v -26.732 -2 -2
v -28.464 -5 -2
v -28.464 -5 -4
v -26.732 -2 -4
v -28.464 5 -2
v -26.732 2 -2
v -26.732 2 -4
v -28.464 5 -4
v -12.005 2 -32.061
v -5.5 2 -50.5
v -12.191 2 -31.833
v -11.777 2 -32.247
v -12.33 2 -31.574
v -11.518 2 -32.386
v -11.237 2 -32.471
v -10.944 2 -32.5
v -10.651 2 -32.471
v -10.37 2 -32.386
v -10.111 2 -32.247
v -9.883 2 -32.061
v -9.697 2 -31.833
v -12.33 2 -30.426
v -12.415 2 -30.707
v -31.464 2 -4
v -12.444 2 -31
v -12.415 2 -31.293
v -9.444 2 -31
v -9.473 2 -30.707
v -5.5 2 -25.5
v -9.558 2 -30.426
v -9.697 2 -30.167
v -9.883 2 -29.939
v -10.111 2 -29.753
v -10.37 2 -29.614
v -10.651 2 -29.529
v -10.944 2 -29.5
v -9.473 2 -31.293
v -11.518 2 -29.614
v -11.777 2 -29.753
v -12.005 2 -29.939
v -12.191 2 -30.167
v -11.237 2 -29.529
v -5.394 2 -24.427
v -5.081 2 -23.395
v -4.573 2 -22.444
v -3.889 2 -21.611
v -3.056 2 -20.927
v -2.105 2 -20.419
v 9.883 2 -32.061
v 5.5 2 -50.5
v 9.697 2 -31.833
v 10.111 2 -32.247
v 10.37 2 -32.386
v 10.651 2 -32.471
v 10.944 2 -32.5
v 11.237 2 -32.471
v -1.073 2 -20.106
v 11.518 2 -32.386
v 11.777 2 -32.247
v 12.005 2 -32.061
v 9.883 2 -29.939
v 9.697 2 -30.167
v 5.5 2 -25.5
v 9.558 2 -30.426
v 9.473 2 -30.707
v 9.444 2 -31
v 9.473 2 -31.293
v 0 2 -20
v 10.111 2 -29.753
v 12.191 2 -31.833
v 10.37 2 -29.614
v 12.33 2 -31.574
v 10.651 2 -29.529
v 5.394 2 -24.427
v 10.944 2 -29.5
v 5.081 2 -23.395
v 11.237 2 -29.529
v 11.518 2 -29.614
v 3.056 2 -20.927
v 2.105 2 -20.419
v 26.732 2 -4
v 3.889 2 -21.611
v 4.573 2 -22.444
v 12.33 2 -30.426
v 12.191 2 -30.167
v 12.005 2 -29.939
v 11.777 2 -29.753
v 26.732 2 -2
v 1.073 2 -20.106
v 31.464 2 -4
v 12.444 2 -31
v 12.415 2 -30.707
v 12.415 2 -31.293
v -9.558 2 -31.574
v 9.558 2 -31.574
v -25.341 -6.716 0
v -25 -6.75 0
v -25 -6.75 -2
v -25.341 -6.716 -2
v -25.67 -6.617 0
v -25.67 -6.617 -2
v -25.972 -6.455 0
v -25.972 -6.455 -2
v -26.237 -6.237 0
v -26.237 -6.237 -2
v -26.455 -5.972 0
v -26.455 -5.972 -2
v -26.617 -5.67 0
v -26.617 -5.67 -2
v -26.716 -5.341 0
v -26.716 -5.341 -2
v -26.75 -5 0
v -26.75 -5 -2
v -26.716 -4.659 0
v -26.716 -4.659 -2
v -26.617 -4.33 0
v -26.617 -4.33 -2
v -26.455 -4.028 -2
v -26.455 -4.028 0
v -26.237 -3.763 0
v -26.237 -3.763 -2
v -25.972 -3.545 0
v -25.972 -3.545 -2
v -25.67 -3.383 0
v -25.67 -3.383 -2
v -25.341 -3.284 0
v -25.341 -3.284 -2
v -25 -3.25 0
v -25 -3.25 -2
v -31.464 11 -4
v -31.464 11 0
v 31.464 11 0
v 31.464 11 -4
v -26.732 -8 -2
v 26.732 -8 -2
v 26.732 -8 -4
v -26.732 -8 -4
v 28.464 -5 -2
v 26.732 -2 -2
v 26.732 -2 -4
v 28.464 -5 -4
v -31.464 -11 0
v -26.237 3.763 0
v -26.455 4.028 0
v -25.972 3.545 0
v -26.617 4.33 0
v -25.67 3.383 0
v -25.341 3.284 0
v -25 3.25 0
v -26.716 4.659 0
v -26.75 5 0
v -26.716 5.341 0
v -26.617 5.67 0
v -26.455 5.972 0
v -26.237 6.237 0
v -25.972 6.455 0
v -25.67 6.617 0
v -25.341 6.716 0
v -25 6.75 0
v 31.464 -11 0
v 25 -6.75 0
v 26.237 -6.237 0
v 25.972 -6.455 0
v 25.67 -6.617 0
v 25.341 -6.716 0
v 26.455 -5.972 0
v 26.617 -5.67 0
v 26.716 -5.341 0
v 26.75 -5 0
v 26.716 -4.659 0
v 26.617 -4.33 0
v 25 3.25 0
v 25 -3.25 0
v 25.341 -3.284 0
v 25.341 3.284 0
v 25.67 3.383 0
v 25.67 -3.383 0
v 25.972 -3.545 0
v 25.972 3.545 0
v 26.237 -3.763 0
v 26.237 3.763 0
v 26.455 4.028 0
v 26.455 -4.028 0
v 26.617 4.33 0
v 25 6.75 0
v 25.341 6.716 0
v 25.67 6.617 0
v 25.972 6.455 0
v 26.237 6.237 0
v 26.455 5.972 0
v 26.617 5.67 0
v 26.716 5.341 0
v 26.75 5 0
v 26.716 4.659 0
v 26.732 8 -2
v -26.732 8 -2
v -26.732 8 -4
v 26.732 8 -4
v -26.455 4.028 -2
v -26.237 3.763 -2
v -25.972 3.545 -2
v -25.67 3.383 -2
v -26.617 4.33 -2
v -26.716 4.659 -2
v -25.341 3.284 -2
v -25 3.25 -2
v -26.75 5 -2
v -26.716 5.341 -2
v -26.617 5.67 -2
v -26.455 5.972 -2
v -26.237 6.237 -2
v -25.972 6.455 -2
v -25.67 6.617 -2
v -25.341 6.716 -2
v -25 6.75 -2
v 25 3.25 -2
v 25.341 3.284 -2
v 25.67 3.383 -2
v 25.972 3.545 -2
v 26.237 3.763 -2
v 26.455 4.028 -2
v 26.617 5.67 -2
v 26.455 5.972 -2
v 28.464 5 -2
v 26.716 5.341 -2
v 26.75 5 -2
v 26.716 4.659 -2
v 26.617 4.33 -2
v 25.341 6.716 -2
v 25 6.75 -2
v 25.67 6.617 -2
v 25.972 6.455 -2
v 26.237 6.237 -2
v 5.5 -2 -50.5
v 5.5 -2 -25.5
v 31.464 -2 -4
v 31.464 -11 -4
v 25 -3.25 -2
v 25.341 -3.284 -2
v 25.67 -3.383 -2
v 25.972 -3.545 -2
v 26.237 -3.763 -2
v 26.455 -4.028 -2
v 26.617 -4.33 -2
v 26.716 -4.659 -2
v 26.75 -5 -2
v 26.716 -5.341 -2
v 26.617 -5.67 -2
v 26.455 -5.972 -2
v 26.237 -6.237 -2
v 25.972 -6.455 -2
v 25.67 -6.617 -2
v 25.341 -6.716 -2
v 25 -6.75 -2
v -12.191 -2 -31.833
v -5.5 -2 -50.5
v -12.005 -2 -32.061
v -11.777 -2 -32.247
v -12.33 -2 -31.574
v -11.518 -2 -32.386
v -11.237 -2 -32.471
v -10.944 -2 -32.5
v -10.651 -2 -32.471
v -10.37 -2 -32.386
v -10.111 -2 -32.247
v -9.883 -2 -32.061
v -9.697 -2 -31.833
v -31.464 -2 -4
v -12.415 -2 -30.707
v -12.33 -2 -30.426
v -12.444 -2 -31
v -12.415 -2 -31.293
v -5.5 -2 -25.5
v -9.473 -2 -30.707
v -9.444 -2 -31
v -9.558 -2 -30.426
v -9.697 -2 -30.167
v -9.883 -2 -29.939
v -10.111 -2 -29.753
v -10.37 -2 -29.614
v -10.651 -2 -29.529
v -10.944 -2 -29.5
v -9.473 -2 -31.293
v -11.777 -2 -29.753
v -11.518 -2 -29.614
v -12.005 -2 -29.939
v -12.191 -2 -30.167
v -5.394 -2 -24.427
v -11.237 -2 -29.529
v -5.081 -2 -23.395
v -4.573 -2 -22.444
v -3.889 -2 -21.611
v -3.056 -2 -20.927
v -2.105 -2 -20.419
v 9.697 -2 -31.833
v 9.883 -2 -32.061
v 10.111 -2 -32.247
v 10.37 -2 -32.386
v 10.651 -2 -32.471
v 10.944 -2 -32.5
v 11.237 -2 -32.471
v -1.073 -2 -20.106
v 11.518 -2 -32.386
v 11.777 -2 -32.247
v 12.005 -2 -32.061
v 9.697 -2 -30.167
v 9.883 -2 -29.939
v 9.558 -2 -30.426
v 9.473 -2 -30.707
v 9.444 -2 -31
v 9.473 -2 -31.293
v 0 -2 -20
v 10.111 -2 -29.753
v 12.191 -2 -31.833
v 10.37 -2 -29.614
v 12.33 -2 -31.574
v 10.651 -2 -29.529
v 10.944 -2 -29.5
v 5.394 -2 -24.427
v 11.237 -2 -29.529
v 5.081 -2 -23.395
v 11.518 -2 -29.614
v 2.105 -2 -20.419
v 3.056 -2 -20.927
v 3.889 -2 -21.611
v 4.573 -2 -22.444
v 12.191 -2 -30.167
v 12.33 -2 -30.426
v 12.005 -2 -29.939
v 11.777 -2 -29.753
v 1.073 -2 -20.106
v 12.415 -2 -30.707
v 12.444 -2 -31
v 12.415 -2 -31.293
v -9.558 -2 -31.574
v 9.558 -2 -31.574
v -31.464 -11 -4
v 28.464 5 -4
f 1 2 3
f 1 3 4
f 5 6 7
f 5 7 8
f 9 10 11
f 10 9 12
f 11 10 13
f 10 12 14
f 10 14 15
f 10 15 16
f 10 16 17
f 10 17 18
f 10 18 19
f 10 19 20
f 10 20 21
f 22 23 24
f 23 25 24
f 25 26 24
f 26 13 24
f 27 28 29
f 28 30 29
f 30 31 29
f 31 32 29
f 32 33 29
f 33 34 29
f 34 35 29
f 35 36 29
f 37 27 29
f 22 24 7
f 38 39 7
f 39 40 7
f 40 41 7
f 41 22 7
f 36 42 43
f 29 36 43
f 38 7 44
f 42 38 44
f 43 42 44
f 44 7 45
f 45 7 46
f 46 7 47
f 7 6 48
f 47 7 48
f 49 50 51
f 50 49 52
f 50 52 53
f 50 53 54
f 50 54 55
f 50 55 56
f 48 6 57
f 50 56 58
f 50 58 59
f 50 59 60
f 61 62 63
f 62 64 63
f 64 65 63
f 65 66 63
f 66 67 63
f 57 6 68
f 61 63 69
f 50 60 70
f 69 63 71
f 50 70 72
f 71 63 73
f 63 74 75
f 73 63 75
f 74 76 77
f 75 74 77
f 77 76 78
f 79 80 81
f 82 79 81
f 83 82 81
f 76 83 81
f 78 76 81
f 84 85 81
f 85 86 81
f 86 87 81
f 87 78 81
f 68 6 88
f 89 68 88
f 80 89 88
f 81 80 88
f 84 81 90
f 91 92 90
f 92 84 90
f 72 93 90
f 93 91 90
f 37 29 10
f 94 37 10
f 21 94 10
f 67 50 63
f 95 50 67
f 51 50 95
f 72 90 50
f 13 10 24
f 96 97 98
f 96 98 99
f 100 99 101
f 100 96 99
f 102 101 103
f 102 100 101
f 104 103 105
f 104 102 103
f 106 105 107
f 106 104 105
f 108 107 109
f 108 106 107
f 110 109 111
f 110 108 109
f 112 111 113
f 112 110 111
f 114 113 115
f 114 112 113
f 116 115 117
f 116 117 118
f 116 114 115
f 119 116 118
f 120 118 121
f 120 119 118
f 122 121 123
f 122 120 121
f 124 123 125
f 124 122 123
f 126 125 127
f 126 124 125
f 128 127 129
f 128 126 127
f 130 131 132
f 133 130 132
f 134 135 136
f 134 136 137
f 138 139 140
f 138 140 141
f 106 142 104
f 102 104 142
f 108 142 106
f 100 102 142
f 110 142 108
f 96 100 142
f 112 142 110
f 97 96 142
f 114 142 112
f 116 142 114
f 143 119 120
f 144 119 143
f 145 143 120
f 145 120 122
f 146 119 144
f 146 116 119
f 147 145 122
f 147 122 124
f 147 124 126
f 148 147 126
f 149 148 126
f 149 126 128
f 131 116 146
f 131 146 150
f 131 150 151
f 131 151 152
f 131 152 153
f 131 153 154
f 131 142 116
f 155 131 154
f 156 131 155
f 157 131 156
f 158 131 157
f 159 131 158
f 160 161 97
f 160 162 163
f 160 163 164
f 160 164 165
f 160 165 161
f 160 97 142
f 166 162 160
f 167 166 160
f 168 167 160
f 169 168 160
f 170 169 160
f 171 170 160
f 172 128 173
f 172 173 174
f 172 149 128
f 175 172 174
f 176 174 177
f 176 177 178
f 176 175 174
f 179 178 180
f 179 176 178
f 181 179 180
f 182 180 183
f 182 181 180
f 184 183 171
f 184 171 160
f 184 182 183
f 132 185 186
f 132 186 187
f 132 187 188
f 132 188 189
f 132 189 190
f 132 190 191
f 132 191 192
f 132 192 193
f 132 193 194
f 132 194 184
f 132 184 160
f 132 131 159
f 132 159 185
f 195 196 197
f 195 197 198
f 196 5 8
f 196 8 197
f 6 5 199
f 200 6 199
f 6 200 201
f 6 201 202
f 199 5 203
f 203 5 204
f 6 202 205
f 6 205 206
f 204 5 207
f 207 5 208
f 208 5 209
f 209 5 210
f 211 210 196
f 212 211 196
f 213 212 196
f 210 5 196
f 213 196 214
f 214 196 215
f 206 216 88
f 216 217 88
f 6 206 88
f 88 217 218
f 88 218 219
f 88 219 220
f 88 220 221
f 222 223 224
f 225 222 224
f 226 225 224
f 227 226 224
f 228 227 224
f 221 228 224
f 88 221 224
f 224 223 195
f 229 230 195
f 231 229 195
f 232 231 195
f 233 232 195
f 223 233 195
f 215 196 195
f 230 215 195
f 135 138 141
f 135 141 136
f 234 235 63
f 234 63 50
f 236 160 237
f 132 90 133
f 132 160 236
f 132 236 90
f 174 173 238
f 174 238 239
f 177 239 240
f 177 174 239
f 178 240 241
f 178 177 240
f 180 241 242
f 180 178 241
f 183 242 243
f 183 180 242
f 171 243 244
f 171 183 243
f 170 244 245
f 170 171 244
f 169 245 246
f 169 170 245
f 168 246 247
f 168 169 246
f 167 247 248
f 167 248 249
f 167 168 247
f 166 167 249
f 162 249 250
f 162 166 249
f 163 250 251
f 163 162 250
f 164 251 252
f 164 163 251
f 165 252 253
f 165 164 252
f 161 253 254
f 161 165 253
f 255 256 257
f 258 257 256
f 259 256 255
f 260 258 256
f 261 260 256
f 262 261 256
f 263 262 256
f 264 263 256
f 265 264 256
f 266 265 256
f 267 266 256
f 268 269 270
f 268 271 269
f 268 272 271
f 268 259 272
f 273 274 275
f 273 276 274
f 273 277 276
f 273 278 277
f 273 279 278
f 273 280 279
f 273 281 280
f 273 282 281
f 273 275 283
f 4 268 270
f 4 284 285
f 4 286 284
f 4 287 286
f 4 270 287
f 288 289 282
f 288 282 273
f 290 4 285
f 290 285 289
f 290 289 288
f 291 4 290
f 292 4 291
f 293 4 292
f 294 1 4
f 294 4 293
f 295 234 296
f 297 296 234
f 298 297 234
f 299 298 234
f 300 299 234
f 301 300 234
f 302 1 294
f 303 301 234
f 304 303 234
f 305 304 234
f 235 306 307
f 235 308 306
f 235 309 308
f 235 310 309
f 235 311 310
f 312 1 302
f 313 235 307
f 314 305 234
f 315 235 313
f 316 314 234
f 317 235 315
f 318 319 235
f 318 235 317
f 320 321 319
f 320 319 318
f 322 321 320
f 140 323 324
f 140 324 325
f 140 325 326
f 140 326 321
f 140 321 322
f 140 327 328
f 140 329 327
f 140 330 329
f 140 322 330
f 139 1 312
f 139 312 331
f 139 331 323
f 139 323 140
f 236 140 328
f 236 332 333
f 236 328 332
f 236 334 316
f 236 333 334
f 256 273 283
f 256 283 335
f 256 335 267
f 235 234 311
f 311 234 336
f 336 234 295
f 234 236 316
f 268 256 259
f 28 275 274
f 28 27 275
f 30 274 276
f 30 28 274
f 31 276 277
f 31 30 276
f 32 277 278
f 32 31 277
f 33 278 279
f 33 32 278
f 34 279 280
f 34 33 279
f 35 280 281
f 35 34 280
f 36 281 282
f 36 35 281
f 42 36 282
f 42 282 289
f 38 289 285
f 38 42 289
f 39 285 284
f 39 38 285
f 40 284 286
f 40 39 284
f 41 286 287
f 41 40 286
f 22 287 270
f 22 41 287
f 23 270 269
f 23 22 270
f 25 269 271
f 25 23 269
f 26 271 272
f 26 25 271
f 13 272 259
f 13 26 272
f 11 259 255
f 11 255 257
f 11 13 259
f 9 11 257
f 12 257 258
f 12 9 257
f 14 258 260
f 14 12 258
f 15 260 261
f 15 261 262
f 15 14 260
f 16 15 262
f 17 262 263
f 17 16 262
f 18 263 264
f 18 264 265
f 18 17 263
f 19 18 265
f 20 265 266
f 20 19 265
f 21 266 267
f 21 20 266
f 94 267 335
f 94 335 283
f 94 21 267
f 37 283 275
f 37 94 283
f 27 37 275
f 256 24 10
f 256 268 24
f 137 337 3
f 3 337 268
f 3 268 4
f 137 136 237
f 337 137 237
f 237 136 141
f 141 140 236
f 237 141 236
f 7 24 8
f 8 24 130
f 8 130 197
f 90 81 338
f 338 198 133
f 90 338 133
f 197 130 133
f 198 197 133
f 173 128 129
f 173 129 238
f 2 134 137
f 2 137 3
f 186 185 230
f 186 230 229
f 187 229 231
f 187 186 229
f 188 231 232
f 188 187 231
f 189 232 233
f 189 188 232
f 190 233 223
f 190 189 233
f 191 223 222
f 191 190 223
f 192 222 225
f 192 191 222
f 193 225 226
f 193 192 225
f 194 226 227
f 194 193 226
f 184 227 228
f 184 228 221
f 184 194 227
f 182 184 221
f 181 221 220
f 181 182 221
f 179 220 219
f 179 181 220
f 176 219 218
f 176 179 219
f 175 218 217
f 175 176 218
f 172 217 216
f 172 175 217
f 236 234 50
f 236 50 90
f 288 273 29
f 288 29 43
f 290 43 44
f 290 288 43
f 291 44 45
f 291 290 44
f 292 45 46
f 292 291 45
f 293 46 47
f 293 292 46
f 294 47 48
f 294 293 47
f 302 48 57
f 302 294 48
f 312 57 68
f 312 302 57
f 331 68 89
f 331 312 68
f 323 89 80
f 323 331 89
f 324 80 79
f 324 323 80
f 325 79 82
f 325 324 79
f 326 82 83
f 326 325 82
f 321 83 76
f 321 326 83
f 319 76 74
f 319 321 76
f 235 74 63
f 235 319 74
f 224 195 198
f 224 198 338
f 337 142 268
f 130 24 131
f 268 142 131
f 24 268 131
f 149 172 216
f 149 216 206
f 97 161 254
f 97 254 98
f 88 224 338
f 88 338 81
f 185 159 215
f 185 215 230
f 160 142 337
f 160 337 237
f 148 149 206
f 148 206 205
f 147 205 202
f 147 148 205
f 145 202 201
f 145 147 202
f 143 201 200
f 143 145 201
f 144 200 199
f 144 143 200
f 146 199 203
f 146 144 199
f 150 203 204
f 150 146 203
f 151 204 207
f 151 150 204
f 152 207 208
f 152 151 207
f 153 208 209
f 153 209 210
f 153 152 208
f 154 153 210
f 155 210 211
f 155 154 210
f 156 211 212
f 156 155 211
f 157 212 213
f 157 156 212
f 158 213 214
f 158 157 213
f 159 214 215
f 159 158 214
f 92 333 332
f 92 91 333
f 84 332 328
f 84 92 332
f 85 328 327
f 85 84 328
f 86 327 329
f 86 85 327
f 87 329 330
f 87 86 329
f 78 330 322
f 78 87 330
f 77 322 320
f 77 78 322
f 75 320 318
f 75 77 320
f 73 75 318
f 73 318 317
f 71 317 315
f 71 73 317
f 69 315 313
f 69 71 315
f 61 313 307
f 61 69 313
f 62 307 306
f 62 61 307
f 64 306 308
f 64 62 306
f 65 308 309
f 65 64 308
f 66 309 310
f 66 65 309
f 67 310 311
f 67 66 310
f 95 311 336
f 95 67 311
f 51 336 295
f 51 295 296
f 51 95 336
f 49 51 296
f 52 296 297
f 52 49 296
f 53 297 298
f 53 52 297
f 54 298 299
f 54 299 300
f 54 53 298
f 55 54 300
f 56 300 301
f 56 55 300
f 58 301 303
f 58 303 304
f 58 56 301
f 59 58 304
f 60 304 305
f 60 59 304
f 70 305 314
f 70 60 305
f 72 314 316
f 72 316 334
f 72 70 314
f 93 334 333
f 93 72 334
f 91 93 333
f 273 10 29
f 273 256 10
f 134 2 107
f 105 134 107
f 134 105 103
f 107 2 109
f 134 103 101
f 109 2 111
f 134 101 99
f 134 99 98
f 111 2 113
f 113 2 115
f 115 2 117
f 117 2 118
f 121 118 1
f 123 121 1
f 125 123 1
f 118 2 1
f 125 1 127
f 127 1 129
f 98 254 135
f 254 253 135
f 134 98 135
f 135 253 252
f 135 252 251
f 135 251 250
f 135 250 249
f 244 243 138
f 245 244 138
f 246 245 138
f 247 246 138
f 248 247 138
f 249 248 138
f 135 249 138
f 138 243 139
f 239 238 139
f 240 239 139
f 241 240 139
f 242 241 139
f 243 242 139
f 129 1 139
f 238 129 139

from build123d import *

# Parameters (mm, degrees)
F0_W     = 62.928204
F0_H     = 22
F1_DEPTH = 4
F2_DEPTH = 2
F3_R     = 1.5
F4_DEPTH = 2


with BuildPart() as f1:
    # F0 (on Top) → F1 (new body)
    with BuildSketch(Plane.XY):
        Rectangle(F0_W, F0_H)
        Polygon((-26.732051, -2), (26.732051, -2), (28.464102, -5), (26.732051, -8), (-26.732051, -8), (-28.464102, -5), align=None, mode=Mode.SUBTRACT)
        Polygon((-26.732051, 2), (-28.464102, 5), (-26.732051, 8), (26.732051, 8), (28.464102, 5), (26.732051, 2), align=None, mode=Mode.SUBTRACT)
    extrude(amount=-F1_DEPTH)

    # F0 (on Top) → F2 (join)
    with BuildSketch(Plane.XY):
        Polygon((28.464102, -5), (26.732051, -2), (-26.732051, -2), (-28.464102, -5), (-26.732051, -8), (26.732051, -8), align=None)
        with BuildLine():
            ThreePointArc((-25, -6.75), (-26.75, -5), (-25, -3.25))
            Line((-25, -3.25), (25, -3.25))
            ThreePointArc((25, -3.25), (26.75, -5), (25, -6.75))
            Line((25, -6.75), (-25, -6.75))
        make_face(mode=Mode.SUBTRACT)
        Polygon((-26.732051, 8), (-28.464102, 5), (-26.732051, 2), (26.732051, 2), (28.464102, 5), (26.732051, 8), align=None)
        with BuildLine():
            ThreePointArc((-25, 3.25), (-26.75, 5), (-25, 6.75))
            Line((-25, 6.75), (25, 6.75))
            ThreePointArc((25, 6.75), (26.75, 5), (25, 3.25))
            Line((25, 3.25), (-25, 3.25))
        make_face(mode=Mode.SUBTRACT)
    extrude(amount=-F2_DEPTH)

    # F3 (on Front) → F4 (join, symmetric)
    with BuildSketch(Plane.XZ):
        with BuildLine():
            Line((-5.5, -50.5), (-5.5, -25.5))
            ThreePointArc((-5.5, -25.5), (0, -20), (5.5, -25.5))
            Line((5.5, -25.5), (5.5, -50.5))
            Line((5.5, -50.5), (31.464102, -4))
            Line((31.464102, -4), (-31.464102, -4))
            Line((-31.464102, -4), (-5.5, -50.5))
        make_face()
        with Locations((-10.944086, -31)):
            Circle(F3_R, mode=Mode.SUBTRACT)
        with Locations((10.944086, -31)):
            Circle(F3_R, mode=Mode.SUBTRACT)
    extrude(amount=F4_DEPTH, both=True)


solid = f1.part
